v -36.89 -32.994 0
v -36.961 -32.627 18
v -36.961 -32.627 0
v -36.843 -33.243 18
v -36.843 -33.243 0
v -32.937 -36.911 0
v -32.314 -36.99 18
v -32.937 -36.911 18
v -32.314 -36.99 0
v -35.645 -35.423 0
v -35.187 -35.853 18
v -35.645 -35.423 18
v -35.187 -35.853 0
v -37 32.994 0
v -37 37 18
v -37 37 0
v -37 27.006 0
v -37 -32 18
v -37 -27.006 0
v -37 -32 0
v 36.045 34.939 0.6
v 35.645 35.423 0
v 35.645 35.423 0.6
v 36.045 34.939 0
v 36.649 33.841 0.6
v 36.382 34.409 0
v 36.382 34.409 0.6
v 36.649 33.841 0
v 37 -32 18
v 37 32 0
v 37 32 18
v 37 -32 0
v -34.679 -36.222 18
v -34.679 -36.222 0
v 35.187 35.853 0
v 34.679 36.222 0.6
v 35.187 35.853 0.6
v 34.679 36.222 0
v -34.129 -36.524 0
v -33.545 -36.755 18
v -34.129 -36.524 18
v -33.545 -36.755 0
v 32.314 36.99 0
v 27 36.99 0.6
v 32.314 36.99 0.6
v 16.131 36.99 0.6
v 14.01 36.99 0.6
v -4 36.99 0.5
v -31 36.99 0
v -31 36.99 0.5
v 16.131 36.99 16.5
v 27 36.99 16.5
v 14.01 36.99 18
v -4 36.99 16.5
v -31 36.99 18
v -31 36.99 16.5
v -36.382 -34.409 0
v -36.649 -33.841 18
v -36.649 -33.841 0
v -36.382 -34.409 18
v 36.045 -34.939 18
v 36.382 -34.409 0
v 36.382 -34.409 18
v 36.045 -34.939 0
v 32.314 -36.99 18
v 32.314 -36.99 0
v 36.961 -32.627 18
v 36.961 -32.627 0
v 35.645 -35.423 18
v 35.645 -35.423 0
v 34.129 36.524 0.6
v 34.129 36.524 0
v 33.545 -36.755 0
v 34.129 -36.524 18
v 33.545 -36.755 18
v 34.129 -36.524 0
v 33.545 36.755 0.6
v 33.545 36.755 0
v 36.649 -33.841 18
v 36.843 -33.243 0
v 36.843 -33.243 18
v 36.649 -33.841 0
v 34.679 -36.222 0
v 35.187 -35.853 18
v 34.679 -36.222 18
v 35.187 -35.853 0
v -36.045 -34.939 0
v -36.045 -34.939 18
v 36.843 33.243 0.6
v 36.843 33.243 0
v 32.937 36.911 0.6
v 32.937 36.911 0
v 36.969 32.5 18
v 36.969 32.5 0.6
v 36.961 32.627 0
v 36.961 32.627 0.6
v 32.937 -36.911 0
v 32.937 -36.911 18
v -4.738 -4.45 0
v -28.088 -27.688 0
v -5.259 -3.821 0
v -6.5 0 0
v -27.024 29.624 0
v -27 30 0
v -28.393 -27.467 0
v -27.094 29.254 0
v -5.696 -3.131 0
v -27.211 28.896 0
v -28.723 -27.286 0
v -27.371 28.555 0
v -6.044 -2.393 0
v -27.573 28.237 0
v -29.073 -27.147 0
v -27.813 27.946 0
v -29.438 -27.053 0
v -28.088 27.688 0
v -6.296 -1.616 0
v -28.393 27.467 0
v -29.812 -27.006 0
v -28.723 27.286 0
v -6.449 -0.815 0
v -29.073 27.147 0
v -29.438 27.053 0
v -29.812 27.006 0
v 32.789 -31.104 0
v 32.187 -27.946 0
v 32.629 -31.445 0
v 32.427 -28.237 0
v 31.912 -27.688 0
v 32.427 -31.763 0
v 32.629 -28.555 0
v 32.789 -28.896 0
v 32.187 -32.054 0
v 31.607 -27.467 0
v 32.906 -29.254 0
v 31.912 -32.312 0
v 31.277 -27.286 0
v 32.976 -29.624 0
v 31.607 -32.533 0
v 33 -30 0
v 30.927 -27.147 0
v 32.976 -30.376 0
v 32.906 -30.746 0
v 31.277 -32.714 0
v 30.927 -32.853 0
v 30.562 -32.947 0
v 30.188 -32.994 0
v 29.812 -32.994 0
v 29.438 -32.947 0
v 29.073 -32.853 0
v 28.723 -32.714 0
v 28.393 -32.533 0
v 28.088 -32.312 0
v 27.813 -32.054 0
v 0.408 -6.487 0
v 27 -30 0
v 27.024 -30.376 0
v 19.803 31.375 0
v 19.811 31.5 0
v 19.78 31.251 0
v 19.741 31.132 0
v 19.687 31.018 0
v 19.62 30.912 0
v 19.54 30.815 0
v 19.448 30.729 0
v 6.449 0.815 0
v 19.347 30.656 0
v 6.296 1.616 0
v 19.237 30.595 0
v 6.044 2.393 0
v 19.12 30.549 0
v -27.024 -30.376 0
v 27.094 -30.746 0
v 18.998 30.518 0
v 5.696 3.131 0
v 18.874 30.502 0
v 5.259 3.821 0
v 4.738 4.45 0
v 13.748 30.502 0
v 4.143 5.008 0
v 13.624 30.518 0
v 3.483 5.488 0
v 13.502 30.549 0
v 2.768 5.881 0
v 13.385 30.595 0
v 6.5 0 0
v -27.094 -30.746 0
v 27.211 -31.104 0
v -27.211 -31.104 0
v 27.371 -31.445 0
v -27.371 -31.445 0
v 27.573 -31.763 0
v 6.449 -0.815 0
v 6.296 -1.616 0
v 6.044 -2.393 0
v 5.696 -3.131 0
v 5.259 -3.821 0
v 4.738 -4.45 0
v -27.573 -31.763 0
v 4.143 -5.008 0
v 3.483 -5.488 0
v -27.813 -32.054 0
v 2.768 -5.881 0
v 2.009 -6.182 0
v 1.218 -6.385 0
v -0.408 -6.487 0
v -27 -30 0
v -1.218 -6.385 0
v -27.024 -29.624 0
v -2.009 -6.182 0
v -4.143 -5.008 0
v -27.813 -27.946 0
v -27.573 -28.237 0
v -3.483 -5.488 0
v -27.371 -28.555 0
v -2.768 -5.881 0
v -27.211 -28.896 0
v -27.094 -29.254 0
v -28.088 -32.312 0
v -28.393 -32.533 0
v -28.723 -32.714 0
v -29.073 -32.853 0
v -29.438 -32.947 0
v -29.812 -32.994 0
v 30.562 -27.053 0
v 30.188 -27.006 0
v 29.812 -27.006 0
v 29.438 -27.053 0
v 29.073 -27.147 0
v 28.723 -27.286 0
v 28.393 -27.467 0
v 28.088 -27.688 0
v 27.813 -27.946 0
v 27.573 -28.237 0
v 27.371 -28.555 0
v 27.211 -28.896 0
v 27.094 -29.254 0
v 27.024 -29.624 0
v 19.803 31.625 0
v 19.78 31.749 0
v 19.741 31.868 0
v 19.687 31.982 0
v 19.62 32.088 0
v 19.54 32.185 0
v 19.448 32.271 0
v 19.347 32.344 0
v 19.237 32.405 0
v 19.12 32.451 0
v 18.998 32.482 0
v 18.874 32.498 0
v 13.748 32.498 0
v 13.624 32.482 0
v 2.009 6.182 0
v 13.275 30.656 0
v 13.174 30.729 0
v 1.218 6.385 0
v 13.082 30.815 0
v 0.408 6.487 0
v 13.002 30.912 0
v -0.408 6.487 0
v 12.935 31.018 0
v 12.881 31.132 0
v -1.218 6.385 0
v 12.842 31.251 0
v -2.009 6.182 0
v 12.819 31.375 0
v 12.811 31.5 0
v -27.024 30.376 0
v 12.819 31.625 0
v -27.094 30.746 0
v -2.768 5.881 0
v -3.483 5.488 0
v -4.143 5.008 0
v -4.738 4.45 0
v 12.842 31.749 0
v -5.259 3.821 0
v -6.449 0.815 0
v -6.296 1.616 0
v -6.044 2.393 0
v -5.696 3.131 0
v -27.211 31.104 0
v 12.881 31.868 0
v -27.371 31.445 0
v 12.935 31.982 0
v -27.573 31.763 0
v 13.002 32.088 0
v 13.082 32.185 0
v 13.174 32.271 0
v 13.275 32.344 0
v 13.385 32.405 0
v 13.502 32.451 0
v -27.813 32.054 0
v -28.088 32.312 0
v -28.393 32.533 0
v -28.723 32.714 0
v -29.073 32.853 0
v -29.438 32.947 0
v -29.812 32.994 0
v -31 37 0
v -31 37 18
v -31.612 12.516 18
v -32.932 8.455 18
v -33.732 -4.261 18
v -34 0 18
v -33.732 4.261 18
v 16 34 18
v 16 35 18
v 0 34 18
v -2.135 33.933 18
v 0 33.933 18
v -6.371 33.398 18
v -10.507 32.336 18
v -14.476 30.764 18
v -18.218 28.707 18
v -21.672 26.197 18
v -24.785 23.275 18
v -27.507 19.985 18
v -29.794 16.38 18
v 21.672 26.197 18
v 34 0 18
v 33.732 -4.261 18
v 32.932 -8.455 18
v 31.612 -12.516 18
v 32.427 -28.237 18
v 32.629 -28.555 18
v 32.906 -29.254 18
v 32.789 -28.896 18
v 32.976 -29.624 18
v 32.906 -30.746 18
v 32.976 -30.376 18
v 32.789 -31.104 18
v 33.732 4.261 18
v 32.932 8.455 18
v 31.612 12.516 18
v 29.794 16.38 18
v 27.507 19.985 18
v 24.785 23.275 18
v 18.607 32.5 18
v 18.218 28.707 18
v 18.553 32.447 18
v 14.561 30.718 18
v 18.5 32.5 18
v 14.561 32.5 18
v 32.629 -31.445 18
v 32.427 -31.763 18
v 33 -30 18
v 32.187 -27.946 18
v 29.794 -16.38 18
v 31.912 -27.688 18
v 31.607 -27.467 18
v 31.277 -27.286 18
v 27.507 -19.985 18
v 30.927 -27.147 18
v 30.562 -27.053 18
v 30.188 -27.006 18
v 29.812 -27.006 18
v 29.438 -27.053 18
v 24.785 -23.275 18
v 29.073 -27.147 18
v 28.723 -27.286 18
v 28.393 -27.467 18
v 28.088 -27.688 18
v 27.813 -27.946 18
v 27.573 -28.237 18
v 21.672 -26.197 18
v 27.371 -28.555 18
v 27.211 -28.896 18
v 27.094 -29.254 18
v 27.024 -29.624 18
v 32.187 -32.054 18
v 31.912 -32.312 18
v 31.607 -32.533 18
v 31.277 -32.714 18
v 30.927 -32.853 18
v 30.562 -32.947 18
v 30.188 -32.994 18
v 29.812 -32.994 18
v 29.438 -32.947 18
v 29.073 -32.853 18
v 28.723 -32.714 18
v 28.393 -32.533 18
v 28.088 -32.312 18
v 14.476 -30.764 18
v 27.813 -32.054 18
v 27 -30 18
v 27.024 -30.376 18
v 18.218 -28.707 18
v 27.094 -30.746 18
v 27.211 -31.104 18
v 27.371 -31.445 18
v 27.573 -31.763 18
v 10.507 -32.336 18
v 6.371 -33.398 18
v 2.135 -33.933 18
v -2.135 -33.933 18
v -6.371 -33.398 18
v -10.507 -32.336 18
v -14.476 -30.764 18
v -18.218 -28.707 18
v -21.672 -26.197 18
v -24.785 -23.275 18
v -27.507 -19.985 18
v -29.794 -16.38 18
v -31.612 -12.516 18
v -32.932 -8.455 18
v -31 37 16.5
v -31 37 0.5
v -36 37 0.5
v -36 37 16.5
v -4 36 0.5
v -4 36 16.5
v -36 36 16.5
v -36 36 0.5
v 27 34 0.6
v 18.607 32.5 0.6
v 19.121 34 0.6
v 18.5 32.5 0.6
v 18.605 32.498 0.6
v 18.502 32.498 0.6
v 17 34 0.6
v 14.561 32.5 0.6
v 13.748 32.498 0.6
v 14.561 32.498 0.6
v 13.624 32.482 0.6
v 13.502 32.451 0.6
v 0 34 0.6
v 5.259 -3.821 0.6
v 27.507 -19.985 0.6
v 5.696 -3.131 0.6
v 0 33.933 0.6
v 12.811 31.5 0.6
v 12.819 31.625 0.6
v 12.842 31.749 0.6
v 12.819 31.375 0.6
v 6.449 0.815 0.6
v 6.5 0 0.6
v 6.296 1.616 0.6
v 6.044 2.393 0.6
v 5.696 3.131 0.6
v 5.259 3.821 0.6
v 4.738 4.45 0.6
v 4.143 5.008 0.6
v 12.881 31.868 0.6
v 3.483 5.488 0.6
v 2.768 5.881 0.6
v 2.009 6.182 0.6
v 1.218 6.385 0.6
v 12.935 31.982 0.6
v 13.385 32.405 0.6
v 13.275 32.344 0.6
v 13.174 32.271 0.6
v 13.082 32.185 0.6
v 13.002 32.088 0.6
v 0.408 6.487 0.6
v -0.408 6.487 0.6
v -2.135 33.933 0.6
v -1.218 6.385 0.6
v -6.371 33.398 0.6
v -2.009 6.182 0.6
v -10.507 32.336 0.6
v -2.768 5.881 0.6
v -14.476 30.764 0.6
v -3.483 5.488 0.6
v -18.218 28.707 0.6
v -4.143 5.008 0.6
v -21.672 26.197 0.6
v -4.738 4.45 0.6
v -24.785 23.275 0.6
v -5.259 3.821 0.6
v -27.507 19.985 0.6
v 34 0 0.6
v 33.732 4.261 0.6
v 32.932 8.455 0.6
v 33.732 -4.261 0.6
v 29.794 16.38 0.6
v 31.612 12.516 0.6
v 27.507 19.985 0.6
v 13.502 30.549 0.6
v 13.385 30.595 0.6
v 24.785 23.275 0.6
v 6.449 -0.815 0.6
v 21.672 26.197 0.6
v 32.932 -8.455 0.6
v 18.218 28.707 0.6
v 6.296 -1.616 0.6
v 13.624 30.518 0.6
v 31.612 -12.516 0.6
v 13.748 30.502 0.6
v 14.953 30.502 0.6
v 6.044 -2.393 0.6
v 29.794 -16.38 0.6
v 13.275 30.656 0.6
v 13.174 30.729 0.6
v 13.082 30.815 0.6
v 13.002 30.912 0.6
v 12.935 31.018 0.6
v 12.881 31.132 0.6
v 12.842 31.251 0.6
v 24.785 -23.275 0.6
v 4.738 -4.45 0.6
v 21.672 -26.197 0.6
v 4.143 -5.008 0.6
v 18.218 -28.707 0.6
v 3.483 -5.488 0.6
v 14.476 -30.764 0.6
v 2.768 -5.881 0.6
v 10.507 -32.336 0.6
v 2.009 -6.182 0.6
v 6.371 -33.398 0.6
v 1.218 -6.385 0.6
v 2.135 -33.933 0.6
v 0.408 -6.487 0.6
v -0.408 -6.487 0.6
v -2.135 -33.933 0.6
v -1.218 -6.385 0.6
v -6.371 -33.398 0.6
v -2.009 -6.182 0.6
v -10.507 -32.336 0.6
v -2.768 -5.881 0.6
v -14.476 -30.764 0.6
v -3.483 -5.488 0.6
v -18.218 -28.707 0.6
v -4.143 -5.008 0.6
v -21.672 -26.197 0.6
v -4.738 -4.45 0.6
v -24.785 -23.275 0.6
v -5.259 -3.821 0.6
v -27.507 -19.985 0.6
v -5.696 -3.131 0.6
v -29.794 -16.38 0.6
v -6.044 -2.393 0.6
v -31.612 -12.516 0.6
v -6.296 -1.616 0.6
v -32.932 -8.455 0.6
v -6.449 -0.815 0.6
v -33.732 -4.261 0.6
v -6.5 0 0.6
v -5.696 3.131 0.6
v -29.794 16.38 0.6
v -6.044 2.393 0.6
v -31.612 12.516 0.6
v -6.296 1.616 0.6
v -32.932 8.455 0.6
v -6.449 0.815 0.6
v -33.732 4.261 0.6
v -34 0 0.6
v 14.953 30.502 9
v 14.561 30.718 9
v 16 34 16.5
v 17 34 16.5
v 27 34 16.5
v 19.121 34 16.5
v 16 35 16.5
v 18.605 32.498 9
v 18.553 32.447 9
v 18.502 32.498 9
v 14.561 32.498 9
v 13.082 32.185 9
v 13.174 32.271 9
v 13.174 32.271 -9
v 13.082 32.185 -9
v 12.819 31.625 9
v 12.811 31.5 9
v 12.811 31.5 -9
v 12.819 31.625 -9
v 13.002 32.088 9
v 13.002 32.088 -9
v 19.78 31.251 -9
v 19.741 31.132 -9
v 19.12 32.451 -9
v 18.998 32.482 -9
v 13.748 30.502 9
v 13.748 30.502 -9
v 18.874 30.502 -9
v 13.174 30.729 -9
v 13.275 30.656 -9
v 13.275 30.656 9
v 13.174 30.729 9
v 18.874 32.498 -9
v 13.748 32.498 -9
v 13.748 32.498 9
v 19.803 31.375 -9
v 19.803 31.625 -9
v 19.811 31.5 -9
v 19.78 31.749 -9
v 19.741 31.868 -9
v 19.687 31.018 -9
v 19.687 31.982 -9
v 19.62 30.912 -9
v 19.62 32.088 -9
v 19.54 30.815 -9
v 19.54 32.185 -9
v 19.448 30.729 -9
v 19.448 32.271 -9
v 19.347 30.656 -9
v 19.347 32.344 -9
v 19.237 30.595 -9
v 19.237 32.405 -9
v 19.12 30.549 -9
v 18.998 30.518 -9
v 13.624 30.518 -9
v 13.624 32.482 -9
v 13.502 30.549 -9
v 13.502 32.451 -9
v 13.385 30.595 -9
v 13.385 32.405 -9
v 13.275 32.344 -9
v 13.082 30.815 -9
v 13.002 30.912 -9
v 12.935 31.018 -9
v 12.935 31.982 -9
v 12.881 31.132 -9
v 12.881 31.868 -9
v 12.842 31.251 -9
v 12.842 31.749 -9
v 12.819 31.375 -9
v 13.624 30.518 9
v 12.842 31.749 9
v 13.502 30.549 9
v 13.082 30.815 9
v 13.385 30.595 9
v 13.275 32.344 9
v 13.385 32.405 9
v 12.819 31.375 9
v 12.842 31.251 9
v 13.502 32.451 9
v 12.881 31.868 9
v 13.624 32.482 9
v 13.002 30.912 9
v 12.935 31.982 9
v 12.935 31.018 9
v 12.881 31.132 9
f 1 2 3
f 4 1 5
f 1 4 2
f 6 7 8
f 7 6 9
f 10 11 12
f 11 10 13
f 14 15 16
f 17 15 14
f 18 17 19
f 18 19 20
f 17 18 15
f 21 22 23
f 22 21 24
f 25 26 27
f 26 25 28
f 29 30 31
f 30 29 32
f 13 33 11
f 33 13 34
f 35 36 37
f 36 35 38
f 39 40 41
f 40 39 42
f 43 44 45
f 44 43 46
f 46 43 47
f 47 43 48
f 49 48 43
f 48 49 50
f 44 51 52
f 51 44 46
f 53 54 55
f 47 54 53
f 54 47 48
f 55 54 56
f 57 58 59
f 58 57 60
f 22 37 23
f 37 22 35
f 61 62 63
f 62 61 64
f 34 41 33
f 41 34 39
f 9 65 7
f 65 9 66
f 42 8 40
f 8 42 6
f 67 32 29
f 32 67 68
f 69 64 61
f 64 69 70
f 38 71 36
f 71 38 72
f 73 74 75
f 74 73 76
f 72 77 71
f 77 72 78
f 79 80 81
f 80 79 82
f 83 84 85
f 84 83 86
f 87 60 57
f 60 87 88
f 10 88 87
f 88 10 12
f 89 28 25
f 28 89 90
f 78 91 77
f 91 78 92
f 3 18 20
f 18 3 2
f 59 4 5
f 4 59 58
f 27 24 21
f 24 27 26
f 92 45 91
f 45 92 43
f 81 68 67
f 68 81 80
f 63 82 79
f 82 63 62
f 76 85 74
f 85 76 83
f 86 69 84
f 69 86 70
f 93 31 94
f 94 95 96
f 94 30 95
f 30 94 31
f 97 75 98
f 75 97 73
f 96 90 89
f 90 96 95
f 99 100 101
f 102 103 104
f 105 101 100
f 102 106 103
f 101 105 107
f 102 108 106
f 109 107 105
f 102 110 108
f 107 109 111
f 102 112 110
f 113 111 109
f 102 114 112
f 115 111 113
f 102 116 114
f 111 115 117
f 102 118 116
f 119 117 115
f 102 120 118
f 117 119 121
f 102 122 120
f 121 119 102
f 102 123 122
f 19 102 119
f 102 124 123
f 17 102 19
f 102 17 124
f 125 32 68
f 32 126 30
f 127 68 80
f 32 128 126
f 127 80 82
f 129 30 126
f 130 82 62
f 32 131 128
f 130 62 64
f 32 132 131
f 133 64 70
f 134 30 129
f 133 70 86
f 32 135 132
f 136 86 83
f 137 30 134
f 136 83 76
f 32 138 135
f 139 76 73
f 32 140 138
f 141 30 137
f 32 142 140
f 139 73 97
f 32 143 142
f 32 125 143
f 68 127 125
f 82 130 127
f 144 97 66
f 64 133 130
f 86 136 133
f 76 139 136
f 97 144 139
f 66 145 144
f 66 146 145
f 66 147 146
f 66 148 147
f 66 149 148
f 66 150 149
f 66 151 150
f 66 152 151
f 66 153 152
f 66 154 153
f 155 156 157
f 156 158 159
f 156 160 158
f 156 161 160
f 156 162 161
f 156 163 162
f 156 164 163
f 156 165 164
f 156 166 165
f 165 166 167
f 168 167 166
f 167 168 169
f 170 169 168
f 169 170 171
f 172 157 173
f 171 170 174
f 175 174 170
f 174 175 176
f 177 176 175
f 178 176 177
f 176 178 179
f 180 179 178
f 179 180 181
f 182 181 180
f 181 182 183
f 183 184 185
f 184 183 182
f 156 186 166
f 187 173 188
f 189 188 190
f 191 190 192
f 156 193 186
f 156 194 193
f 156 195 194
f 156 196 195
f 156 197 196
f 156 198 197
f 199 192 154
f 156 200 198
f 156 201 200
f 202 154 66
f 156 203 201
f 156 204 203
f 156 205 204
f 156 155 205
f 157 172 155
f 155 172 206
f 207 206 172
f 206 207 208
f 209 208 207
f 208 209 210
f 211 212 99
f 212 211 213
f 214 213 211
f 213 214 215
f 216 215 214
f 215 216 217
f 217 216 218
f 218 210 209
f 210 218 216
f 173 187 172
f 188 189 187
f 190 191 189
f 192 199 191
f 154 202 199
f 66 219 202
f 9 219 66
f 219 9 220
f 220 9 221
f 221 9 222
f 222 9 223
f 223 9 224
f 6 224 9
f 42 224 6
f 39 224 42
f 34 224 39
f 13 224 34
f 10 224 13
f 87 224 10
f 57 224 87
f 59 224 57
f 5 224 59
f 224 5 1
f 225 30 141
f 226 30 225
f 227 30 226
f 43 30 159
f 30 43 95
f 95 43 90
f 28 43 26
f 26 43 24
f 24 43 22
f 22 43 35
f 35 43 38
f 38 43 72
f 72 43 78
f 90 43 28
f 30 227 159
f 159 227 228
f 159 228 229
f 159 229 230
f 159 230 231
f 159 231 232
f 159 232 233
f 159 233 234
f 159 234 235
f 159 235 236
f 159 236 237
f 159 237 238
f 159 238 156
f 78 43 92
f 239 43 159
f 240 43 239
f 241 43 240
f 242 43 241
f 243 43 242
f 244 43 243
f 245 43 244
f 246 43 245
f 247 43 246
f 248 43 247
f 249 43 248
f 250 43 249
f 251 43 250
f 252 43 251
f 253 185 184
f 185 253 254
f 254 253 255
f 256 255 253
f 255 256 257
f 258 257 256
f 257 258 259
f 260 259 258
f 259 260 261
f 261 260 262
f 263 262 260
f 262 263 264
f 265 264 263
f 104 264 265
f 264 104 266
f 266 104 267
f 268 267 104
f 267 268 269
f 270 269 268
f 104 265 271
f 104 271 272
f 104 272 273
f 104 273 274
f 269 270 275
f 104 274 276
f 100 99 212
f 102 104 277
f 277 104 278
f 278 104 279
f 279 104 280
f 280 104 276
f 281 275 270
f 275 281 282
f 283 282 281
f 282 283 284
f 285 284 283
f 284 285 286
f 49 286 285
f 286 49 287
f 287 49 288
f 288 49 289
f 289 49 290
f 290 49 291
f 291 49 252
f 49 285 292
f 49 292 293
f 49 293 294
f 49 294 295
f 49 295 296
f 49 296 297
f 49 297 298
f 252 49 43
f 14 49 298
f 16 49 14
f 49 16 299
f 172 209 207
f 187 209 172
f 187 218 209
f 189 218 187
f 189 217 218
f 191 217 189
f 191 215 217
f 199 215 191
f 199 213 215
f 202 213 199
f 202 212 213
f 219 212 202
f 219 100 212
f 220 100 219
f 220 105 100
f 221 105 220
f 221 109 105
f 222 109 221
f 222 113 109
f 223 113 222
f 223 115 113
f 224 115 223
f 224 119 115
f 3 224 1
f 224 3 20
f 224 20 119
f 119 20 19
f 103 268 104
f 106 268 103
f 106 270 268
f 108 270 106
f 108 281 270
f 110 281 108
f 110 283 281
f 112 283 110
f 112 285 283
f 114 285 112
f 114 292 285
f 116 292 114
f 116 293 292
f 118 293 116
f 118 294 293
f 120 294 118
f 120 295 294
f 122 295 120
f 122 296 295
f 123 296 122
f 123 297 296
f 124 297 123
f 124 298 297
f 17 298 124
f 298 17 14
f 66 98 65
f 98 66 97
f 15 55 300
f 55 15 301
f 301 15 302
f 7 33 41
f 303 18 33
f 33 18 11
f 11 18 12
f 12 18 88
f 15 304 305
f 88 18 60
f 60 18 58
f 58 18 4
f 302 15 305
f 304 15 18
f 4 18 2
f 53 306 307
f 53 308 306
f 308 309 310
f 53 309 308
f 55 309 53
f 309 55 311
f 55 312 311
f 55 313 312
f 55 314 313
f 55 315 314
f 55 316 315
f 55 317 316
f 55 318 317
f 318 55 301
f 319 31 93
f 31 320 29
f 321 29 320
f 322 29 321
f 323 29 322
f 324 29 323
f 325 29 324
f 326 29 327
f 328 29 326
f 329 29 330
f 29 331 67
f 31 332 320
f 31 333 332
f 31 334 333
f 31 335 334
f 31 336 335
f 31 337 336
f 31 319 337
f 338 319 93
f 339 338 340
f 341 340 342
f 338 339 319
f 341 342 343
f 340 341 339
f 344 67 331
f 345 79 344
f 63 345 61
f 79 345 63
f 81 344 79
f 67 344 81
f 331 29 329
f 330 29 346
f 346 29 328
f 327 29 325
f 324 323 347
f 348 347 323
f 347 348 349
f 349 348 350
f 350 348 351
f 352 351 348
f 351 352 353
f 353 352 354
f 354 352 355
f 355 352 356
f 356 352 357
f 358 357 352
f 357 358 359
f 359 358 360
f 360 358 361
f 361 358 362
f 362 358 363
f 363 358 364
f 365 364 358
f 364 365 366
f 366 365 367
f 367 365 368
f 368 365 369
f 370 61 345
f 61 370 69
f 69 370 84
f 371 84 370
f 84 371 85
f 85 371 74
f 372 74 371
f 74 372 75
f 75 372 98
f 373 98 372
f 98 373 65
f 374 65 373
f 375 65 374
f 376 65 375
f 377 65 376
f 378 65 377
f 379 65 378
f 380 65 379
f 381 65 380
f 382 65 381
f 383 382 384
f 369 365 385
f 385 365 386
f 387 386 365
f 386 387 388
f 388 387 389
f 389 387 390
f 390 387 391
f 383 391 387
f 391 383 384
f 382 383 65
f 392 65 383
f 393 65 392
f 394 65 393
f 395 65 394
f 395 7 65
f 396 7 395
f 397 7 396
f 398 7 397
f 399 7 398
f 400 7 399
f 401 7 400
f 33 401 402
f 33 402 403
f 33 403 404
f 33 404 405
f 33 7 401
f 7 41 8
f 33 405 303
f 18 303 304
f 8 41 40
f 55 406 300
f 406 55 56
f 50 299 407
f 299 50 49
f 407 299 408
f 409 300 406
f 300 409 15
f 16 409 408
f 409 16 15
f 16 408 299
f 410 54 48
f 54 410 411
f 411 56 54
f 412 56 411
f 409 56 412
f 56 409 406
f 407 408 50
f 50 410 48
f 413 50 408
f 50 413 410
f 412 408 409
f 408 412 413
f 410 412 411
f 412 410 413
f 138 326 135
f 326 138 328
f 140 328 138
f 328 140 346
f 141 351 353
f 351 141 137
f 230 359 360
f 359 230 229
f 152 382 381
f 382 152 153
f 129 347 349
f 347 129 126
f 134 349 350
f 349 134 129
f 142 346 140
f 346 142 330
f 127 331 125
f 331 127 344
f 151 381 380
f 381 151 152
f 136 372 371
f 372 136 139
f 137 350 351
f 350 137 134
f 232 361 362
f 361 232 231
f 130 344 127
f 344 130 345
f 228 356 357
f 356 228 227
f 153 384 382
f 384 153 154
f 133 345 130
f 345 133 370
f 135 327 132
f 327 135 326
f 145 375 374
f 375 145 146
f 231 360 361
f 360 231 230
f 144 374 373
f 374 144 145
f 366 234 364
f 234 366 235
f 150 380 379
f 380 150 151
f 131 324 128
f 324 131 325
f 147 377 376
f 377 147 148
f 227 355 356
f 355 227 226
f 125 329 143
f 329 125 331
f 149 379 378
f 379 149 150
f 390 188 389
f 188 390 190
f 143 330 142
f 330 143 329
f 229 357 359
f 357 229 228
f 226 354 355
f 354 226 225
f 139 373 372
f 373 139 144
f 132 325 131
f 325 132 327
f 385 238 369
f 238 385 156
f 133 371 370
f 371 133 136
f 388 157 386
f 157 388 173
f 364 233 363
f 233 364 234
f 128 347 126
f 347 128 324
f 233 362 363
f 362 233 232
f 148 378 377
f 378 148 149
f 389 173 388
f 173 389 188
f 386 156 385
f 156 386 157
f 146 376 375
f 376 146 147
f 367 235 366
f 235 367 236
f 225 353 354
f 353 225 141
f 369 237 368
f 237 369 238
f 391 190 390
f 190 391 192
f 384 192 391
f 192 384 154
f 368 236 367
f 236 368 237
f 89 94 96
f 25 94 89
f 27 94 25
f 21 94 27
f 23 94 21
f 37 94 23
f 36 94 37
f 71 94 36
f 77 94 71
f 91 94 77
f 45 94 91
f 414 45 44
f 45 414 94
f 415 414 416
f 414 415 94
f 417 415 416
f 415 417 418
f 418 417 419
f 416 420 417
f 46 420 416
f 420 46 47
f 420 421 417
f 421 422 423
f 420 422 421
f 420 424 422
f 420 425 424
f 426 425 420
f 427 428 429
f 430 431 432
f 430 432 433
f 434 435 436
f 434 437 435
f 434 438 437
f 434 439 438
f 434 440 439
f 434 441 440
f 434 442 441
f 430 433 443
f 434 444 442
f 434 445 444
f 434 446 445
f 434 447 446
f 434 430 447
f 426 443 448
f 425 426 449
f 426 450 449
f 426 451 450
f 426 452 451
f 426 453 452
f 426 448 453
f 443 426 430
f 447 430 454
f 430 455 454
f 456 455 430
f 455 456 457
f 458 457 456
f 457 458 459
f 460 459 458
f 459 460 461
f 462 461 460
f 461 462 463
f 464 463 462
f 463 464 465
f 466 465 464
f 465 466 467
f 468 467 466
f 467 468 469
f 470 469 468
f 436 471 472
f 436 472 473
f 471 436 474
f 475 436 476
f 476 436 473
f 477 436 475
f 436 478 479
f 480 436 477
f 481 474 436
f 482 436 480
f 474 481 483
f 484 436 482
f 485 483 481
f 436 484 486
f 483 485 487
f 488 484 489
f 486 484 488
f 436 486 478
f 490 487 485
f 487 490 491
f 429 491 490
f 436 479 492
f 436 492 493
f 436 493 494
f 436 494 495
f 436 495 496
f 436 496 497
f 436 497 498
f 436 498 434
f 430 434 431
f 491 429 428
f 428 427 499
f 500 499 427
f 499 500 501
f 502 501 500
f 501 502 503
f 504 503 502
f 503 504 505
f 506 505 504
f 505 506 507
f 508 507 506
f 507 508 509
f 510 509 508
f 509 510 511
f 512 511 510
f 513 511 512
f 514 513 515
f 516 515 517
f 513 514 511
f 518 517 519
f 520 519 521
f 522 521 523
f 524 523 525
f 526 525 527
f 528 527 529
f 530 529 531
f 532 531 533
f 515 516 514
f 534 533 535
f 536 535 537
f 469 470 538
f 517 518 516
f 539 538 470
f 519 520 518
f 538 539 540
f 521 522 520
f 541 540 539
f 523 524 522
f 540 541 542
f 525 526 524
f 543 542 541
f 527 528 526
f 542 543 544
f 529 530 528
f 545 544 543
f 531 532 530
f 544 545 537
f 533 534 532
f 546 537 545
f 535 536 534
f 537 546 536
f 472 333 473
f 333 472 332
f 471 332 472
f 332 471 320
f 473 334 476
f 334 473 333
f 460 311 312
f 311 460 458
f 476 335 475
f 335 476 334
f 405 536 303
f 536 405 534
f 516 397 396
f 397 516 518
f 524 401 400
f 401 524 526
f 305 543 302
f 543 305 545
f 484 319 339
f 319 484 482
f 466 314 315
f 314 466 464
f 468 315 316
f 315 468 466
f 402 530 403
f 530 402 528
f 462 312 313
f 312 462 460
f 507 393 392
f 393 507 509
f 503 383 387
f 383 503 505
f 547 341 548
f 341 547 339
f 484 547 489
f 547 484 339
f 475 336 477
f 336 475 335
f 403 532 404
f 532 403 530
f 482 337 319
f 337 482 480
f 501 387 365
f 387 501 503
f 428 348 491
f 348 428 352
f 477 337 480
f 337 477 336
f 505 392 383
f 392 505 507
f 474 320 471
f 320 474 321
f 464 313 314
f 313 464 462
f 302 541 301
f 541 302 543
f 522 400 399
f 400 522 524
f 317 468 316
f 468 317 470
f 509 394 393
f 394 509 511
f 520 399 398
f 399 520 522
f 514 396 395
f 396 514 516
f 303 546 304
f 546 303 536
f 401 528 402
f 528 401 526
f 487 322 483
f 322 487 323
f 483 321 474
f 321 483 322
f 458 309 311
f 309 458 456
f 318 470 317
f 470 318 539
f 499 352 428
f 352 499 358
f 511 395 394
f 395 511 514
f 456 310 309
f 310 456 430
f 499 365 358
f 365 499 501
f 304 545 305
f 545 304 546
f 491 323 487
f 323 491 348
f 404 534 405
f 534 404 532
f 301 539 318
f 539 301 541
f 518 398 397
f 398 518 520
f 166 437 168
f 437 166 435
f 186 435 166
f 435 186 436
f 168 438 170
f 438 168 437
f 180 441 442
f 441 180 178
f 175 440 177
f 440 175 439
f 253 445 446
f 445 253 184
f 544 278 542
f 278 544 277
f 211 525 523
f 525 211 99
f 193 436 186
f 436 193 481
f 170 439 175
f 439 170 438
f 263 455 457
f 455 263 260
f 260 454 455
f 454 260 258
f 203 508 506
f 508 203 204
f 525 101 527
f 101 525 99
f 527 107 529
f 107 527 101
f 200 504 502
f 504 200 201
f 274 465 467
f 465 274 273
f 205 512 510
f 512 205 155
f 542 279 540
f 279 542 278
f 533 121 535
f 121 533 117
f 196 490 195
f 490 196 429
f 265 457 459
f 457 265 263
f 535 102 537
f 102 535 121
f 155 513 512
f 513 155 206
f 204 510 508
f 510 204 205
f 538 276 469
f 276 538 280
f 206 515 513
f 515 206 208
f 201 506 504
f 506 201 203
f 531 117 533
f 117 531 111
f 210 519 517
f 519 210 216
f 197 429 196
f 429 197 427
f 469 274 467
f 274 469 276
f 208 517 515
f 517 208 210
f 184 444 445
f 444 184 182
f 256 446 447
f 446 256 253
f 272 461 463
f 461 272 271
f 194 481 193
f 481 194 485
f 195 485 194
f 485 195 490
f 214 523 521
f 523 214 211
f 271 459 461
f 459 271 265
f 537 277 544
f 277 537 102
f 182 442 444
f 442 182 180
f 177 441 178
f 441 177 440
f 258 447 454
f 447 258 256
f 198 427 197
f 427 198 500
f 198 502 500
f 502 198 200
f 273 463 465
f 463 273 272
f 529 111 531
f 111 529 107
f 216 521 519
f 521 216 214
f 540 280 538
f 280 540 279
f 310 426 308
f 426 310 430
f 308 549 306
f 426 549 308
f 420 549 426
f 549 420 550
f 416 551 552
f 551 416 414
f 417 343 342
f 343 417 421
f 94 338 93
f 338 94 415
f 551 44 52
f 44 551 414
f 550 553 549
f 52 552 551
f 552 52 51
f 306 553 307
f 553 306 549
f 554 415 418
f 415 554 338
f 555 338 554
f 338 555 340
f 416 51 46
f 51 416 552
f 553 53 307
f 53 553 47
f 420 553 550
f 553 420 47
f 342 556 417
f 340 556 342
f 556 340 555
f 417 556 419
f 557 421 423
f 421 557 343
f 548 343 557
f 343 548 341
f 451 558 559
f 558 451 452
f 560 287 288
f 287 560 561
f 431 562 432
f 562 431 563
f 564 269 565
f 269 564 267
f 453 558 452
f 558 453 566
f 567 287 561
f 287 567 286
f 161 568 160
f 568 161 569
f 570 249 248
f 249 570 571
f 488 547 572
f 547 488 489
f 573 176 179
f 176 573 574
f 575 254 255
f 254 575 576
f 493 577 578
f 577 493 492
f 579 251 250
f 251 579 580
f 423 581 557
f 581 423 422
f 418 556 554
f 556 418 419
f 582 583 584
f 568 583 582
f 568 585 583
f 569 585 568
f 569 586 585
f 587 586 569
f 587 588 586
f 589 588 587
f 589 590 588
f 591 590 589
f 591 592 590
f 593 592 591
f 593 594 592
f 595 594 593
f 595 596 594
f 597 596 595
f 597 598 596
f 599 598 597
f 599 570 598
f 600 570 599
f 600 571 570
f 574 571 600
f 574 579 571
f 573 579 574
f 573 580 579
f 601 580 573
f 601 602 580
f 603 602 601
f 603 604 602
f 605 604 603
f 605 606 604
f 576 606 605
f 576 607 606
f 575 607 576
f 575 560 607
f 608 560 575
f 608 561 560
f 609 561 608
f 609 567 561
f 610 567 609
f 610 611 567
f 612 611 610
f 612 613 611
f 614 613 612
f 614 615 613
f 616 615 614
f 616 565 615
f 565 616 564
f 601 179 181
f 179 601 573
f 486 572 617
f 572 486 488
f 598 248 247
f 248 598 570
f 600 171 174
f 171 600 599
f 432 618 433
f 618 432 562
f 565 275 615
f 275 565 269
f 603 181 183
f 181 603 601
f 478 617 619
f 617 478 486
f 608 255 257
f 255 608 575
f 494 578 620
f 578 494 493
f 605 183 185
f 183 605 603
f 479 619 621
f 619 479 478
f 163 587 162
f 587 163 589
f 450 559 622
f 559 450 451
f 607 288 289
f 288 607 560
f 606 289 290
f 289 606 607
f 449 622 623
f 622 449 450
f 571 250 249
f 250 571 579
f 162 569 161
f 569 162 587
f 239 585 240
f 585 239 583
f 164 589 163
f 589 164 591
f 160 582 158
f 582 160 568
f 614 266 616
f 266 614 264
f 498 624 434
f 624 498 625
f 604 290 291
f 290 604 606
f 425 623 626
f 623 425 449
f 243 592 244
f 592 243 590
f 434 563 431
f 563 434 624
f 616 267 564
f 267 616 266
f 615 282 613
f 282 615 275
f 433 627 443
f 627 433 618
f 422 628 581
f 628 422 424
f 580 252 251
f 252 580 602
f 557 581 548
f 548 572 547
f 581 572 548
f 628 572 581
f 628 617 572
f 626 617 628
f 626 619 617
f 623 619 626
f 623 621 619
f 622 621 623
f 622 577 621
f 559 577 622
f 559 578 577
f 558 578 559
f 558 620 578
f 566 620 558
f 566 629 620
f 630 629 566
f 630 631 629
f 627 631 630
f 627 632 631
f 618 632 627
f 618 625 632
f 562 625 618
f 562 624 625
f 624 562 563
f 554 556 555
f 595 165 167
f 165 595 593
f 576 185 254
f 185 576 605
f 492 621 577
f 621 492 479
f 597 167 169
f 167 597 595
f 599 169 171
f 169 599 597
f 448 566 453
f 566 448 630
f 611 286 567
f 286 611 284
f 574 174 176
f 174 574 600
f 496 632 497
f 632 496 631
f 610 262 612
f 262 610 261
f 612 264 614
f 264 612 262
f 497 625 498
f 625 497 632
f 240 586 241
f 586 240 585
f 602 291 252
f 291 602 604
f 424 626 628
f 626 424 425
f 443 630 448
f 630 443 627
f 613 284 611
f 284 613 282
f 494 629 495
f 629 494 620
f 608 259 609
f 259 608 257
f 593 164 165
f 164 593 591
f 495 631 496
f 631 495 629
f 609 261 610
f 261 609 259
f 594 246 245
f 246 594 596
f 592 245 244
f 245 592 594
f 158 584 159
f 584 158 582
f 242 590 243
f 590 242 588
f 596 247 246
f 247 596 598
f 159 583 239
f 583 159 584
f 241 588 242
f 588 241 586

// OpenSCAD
$fn = 50;


union() {
	difference() {
		union() {
			hull() {
				translate(v = [-32.0000000000, 32.0000000000, 0]) {
					cylinder(h = 18, r = 5);
				}
				translate(v = [32.0000000000, 32.0000000000, 0]) {
					cylinder(h = 18, r = 5);
				}
				translate(v = [-32.0000000000, -32.0000000000, 0]) {
					cylinder(h = 18, r = 5);
				}
				translate(v = [32.0000000000, -32.0000000000, 0]) {
					cylinder(h = 18, r = 5);
				}
			}
			translate(v = [-37.0000000000, 31.0000000000, 0]) {
				cube(size = [6, 6, 18]);
			}
		}
		union() {
			translate(v = [-37.5000000000, -30.0000000000, -250.0000000000]) {
				rotate(a = [0, 0, 0]) {
					difference() {
						union() {
							hull() {
								translate(v = [7.5000000000, 0, 0]) {
									cylinder(h = 250, r = 3.0000000000, r1 = 3.0000000000, r2 = 3.0000000000);
								}
								translate(v = [-7.5000000000, 0, 0]) {
									cylinder(h = 250, r = 3.0000000000, r1 = 3.0000000000, r2 = 3.0000000000);
								}
							}
						}
						union();
					}
				}
			}
			translate(v = [-37.5000000000, 30.0000000000, -250.0000000000]) {
				rotate(a = [0, 0, 0]) {
					difference() {
						union() {
							hull() {
								translate(v = [7.5000000000, 0, 0]) {
									cylinder(h = 250, r = 3.0000000000, r1 = 3.0000000000, r2 = 3.0000000000);
								}
								translate(v = [-7.5000000000, 0, 0]) {
									cylinder(h = 250, r = 3.0000000000, r1 = 3.0000000000, r2 = 3.0000000000);
								}
							}
						}
						union();
					}
				}
			}
			translate(v = [-36.0000000000, 36.0000000000, 0.5000000000]) {
				cube(size = [32, 1, 16]);
			}
			translate(v = [30.0000000000, -30.0000000000, 0]) {
				cylinder(h = 100, r = 3.0000000000);
			}
			translate(v = [0, 0, 0.6000000000]) {
				cylinder(h = 20.4000000000, r = 34.0000000000);
			}
			translate(v = [0, 0, -9.0000000000]) {
				cylinder(h = 18, r = 6.5000000000);
			}
			translate(v = [0.0000000000, 32.5000000000, 0.6000000000]) {
				cube(size = [37.0000000000, 1.5000000000, 20.4000000000]);
			}
			translate(v = [27.0000000000, 32.5000000000, 0.6000000000]) {
				cube(size = [10, 4.5000000000, 20.4000000000]);
			}
			translate(v = [16.0000000000, 32.5000000000, 16.5000000000]) {
				cube(size = [21, 4.5000000000, 1.5000000000]);
			}
			translate(v = [13.2500000000, 37.7500000000, 0.6000000000]) {
				rotate(a = [0, 0, -45]) {
					cube(size = [7.5000000000, 1.5000000000, 20.4000000000]);
				}
			}
			translate(v = [7.0610000000, 30.5000000000, 0.6000000000]) {
				cube(size = [7.5000000000, 2, 17.4000000000]);
			}
		}
	}
	union() {
		translate(v = [16.3110000000, 31.5000000000, -9.0000000000]) {
			rotate(a = [0, 0, 0]) {
				difference() {
					union() {
						#hull() {
							#translate(v = [2.5000000000, 0, 0]) {
								cylinder(h = 18, r = 1.0000000000, r1 = 1.0000000000, r2 = 1.0000000000);
							}
							#translate(v = [-2.5000000000, 0, 0]) {
								cylinder(h = 18, r = 1.0000000000, r1 = 1.0000000000, r2 = 1.0000000000);
							}
						}
					}
					union();
				}
			}
		}
	}
}
